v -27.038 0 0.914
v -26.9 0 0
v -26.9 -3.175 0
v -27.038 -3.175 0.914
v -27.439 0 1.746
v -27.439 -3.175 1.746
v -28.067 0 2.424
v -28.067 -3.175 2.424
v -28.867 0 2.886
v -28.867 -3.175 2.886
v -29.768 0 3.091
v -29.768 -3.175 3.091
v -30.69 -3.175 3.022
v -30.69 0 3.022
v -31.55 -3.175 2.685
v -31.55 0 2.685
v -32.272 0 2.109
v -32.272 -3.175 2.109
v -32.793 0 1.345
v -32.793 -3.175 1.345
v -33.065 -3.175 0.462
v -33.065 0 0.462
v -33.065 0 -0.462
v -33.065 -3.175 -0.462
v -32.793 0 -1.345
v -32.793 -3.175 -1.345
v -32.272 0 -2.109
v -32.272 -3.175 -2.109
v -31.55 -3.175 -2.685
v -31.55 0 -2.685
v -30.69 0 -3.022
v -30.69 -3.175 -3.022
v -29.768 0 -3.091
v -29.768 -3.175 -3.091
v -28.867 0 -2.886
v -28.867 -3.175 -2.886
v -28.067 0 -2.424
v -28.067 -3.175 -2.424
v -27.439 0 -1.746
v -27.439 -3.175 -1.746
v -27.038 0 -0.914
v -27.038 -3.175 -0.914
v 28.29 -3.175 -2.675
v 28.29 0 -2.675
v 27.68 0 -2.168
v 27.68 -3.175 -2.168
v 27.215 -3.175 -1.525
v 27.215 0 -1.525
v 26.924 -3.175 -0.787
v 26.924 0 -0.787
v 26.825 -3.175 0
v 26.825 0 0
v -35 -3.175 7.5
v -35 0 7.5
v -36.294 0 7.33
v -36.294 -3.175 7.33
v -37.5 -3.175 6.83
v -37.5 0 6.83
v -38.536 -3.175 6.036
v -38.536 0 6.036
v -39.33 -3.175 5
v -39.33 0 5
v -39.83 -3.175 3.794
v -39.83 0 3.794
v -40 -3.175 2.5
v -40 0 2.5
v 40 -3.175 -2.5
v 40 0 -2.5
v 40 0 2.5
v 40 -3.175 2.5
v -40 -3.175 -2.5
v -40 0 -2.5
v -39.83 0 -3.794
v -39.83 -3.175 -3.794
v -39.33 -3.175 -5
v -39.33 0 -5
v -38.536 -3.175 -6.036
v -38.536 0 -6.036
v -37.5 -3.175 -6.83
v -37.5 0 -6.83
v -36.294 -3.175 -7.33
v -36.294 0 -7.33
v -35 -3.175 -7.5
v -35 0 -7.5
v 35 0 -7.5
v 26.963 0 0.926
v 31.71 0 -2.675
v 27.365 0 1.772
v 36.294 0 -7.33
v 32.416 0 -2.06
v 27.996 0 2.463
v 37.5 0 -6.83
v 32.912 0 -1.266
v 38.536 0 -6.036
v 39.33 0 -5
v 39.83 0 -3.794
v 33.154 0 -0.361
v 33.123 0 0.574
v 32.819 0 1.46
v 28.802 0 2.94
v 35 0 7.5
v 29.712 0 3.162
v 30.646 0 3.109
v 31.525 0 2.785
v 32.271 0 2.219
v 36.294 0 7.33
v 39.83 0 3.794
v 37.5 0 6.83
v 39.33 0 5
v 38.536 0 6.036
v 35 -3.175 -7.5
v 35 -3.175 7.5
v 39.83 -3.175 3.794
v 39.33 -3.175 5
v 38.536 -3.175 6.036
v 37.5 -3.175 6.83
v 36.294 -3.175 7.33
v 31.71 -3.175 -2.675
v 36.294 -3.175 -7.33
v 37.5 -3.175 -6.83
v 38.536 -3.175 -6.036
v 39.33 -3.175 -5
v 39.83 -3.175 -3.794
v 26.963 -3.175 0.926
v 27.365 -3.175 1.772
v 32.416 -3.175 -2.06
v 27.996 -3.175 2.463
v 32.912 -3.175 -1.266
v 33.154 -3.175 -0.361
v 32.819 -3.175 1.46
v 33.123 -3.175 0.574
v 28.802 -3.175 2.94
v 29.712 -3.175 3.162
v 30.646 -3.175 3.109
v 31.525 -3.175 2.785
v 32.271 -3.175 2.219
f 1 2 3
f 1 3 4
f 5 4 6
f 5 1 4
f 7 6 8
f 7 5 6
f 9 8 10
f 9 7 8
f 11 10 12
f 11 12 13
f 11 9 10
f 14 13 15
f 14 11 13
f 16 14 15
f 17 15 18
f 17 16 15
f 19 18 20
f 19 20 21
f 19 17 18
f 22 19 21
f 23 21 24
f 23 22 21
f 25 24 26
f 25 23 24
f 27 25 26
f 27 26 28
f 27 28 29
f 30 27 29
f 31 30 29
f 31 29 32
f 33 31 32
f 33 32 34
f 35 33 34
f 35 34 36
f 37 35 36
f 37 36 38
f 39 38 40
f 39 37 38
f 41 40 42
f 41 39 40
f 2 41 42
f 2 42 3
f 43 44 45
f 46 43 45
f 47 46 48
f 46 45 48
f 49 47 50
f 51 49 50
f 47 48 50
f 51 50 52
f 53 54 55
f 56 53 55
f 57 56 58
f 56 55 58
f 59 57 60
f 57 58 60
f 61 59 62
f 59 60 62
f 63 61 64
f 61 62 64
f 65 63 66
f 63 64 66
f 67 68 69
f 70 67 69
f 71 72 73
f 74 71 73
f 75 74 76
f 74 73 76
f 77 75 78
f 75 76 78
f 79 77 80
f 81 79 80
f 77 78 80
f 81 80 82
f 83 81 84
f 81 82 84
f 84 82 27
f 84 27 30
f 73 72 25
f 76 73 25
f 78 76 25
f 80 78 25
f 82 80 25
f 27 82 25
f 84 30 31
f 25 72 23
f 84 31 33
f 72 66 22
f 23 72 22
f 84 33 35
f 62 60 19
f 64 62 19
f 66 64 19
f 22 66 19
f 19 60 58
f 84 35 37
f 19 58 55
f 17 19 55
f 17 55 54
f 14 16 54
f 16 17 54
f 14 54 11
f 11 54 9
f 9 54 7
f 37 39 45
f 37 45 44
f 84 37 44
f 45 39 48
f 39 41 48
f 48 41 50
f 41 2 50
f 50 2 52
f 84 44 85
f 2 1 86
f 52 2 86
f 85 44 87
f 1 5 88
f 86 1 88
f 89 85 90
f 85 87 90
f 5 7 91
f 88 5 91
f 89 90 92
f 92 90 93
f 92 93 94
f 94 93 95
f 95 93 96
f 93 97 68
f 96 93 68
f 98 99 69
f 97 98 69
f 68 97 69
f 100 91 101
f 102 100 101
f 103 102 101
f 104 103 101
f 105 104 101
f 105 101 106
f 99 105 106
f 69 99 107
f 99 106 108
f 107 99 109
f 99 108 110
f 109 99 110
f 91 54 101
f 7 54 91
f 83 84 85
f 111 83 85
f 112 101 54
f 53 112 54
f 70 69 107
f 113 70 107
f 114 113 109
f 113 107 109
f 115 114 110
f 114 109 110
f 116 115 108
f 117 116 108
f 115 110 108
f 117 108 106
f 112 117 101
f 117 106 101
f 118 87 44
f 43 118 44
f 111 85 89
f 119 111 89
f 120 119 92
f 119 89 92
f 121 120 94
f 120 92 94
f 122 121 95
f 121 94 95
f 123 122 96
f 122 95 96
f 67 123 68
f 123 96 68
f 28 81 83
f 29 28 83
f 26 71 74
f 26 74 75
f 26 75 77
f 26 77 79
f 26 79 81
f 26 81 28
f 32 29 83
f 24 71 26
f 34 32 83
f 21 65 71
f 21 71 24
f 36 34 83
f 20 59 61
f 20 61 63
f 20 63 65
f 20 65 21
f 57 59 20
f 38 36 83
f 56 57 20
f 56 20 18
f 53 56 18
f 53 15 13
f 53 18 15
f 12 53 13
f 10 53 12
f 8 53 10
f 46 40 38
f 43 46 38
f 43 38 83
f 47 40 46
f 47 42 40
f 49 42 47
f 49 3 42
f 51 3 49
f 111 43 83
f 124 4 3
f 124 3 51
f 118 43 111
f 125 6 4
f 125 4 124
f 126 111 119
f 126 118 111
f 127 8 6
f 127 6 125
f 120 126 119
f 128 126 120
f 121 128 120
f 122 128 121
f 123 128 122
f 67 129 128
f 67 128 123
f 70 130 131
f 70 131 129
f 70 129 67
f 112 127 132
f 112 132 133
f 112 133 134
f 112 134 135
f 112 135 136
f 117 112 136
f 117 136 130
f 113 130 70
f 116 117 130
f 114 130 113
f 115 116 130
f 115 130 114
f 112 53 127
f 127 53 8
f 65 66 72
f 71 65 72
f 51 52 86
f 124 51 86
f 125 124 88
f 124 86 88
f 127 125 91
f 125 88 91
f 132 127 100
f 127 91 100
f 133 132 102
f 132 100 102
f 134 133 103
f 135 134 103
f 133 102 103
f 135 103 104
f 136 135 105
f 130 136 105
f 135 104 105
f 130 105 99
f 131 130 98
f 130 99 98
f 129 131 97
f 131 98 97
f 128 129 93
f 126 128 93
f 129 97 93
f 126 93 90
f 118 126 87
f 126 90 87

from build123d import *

# Parameters (mm, degrees)
F0_R     = 3.1
F1_DEPTH = 3.175


with BuildPart() as f1:
    # F0 (on Front) → F1 (new body)
    with BuildSketch(Plane.XZ):
        with BuildLine():
            ThreePointArc((40, 2.5), (38.535534, 6.035534), (35, 7.5))
            Line((35, 7.5), (-35, 7.5))
            ThreePointArc((-35, 7.5), (-38.535534, 6.035534), (-40, 2.5))
            Line((-40, 2.5), (-40, -2.5))
            ThreePointArc((-40, -2.5), (-38.535534, -6.035534), (-35, -7.5))
            Line((-35, -7.5), (35, -7.5))
            ThreePointArc((35, -7.5), (38.535534, -6.035534), (40, -2.5))
            Line((40, -2.5), (40, 2.5))
        make_face()
        with Locations((-30, 0)):
            Circle(F0_R, mode=Mode.SUBTRACT)
        with BuildLine():
            ThreePointArc((28.289735, -2.674999), (27.215156, -1.524883), (26.825, 0))
            ThreePointArc((26.825, 0), (31.524883, 2.784844), (31.710265, -2.674999))
            Line((31.710265, -2.674999), (28.289735, -2.674999))
        make_face(mode=Mode.SUBTRACT)
    extrude(amount=F1_DEPTH)


solid = f1.part
